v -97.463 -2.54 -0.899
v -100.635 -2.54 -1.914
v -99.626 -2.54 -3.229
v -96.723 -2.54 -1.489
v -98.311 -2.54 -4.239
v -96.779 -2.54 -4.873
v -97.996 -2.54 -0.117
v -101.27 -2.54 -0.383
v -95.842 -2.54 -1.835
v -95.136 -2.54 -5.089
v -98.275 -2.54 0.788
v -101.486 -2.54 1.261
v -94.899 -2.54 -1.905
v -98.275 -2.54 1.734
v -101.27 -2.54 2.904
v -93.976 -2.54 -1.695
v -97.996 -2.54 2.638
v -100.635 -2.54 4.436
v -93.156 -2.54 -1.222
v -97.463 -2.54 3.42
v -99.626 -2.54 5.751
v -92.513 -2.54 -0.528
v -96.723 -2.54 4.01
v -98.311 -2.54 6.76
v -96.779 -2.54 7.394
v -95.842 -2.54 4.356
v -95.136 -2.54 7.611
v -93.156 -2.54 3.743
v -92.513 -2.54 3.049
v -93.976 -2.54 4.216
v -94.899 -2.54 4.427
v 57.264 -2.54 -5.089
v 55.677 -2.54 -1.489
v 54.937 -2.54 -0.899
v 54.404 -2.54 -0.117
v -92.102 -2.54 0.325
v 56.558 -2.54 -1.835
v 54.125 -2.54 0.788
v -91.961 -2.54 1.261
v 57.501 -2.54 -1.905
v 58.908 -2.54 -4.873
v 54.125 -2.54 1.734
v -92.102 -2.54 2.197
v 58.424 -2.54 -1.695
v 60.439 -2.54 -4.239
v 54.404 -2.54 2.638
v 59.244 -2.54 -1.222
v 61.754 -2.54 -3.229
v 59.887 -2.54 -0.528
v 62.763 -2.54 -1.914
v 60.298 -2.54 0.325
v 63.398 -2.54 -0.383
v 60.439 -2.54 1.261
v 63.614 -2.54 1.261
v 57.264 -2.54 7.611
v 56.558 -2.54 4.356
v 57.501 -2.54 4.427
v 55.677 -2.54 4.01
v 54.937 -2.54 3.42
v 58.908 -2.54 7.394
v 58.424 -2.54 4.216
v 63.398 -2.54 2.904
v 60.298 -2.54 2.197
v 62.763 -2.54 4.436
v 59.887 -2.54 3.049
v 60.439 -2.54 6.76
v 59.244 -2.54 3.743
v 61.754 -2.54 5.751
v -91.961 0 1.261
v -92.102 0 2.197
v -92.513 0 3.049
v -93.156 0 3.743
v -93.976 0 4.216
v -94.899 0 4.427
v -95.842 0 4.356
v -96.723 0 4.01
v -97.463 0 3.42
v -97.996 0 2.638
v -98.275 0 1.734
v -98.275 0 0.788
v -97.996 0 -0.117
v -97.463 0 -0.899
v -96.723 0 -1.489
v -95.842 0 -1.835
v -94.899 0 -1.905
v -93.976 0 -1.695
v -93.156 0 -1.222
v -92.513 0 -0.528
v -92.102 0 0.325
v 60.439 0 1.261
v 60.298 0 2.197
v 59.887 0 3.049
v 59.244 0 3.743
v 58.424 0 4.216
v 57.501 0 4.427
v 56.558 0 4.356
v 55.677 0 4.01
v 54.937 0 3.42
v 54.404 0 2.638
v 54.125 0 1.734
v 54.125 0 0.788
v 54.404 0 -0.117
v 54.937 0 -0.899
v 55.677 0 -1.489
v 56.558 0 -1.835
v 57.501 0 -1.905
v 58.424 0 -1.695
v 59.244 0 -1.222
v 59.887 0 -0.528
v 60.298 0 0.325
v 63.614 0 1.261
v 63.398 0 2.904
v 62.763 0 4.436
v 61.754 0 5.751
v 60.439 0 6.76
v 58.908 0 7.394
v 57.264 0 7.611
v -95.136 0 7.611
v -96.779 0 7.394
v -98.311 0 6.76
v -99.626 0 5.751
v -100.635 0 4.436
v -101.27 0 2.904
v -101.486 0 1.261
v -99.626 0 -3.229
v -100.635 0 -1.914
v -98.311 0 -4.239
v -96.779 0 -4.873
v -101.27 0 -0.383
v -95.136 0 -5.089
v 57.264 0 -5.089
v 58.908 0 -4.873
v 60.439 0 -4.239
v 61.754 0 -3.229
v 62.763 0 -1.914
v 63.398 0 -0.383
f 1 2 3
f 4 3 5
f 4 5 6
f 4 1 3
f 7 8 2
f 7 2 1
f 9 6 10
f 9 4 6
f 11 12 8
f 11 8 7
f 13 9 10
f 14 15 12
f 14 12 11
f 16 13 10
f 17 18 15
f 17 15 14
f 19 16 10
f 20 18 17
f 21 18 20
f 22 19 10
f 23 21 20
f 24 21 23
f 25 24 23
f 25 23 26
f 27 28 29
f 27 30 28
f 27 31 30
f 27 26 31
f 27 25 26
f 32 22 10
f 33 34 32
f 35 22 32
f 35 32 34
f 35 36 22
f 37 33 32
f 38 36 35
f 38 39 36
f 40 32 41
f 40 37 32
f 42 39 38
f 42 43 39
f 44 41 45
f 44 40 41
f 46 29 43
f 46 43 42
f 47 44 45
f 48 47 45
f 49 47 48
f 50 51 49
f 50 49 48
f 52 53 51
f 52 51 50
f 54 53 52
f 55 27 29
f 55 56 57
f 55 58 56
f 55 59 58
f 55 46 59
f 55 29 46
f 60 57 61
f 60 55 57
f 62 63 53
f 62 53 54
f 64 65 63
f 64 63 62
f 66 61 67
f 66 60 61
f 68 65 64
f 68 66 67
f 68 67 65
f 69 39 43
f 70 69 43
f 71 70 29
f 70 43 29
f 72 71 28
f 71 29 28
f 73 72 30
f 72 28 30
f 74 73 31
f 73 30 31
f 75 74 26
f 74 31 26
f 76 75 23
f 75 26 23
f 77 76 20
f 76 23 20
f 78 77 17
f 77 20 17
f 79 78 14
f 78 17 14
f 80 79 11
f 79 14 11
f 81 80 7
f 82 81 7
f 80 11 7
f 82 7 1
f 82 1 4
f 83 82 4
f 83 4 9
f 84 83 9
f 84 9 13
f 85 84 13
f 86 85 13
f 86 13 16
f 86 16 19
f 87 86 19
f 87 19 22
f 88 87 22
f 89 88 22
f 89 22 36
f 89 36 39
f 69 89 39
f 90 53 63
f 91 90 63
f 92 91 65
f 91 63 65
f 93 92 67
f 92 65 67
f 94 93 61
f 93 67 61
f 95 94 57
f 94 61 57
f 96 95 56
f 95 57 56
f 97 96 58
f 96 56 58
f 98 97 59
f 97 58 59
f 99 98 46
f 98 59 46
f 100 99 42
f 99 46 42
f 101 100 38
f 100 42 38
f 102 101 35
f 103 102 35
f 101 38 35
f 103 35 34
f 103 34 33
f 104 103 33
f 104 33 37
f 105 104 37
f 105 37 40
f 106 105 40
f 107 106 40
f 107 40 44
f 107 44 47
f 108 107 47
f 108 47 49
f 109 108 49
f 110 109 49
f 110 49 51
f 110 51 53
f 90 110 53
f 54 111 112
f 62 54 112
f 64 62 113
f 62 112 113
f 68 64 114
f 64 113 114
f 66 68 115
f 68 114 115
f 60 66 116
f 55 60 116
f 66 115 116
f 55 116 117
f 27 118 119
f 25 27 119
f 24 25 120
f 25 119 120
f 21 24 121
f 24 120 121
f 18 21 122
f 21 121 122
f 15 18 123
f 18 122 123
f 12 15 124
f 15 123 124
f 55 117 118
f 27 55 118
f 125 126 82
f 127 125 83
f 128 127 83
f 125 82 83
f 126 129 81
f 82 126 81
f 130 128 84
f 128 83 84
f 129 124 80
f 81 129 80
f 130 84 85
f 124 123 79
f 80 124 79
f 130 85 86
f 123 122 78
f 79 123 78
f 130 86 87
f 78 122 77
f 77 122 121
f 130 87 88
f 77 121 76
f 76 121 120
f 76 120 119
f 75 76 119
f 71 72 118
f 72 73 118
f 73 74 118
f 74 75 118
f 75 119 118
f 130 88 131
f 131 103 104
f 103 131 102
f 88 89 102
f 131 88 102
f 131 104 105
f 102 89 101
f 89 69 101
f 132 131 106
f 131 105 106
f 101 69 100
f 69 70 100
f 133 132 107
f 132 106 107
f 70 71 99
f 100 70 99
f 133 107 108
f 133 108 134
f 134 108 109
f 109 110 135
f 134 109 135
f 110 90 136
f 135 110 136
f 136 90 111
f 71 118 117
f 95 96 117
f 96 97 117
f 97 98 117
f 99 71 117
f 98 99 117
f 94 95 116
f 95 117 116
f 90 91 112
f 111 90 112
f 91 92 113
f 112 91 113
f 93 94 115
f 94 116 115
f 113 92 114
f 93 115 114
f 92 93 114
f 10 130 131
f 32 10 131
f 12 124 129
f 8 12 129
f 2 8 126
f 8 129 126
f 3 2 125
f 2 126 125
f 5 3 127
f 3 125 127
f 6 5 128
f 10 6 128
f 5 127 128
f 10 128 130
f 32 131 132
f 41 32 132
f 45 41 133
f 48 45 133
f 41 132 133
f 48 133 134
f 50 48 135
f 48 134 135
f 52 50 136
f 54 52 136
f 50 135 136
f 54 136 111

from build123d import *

# Parameters (mm, degrees)
F1_DEPTH = 2.54
F2_R     = 3.175
F3_DEPTH = 2.541


with BuildPart() as f1:
    # F0 (on Front) → F1 (new body)
    with BuildSketch(Plane.XZ):
        with BuildLine():
            ThreePointArc((-101.485908, 1.260738), (-99.626036, -3.22939), (-95.135908, -5.089262))
            Line((-95.135908, -5.089262), (57.264092, -5.089262))
            ThreePointArc((57.264092, -5.089262), (61.75422, -3.22939), (63.614092, 1.260738))
            ThreePointArc((63.614092, 1.260738), (61.75422, 5.750866), (57.264092, 7.610738))
            Line((57.264092, 7.610738), (-95.135908, 7.610738))
            ThreePointArc((-95.135908, 7.610738), (-99.626036, 5.750866), (-101.485908, 1.260738))
        make_face()
    extrude(amount=F1_DEPTH)

    # F2 (on face) → F3 (cut, through all)
    with BuildSketch(Plane.XZ.offset(2.54)):
        with Locations((-95.135908, 1.260738)):
            Circle(F2_R)
        with Locations((57.264092, 1.260738)):
            Circle(F2_R)
    extrude(amount=-F3_DEPTH, mode=Mode.SUBTRACT)


solid = f1.part
